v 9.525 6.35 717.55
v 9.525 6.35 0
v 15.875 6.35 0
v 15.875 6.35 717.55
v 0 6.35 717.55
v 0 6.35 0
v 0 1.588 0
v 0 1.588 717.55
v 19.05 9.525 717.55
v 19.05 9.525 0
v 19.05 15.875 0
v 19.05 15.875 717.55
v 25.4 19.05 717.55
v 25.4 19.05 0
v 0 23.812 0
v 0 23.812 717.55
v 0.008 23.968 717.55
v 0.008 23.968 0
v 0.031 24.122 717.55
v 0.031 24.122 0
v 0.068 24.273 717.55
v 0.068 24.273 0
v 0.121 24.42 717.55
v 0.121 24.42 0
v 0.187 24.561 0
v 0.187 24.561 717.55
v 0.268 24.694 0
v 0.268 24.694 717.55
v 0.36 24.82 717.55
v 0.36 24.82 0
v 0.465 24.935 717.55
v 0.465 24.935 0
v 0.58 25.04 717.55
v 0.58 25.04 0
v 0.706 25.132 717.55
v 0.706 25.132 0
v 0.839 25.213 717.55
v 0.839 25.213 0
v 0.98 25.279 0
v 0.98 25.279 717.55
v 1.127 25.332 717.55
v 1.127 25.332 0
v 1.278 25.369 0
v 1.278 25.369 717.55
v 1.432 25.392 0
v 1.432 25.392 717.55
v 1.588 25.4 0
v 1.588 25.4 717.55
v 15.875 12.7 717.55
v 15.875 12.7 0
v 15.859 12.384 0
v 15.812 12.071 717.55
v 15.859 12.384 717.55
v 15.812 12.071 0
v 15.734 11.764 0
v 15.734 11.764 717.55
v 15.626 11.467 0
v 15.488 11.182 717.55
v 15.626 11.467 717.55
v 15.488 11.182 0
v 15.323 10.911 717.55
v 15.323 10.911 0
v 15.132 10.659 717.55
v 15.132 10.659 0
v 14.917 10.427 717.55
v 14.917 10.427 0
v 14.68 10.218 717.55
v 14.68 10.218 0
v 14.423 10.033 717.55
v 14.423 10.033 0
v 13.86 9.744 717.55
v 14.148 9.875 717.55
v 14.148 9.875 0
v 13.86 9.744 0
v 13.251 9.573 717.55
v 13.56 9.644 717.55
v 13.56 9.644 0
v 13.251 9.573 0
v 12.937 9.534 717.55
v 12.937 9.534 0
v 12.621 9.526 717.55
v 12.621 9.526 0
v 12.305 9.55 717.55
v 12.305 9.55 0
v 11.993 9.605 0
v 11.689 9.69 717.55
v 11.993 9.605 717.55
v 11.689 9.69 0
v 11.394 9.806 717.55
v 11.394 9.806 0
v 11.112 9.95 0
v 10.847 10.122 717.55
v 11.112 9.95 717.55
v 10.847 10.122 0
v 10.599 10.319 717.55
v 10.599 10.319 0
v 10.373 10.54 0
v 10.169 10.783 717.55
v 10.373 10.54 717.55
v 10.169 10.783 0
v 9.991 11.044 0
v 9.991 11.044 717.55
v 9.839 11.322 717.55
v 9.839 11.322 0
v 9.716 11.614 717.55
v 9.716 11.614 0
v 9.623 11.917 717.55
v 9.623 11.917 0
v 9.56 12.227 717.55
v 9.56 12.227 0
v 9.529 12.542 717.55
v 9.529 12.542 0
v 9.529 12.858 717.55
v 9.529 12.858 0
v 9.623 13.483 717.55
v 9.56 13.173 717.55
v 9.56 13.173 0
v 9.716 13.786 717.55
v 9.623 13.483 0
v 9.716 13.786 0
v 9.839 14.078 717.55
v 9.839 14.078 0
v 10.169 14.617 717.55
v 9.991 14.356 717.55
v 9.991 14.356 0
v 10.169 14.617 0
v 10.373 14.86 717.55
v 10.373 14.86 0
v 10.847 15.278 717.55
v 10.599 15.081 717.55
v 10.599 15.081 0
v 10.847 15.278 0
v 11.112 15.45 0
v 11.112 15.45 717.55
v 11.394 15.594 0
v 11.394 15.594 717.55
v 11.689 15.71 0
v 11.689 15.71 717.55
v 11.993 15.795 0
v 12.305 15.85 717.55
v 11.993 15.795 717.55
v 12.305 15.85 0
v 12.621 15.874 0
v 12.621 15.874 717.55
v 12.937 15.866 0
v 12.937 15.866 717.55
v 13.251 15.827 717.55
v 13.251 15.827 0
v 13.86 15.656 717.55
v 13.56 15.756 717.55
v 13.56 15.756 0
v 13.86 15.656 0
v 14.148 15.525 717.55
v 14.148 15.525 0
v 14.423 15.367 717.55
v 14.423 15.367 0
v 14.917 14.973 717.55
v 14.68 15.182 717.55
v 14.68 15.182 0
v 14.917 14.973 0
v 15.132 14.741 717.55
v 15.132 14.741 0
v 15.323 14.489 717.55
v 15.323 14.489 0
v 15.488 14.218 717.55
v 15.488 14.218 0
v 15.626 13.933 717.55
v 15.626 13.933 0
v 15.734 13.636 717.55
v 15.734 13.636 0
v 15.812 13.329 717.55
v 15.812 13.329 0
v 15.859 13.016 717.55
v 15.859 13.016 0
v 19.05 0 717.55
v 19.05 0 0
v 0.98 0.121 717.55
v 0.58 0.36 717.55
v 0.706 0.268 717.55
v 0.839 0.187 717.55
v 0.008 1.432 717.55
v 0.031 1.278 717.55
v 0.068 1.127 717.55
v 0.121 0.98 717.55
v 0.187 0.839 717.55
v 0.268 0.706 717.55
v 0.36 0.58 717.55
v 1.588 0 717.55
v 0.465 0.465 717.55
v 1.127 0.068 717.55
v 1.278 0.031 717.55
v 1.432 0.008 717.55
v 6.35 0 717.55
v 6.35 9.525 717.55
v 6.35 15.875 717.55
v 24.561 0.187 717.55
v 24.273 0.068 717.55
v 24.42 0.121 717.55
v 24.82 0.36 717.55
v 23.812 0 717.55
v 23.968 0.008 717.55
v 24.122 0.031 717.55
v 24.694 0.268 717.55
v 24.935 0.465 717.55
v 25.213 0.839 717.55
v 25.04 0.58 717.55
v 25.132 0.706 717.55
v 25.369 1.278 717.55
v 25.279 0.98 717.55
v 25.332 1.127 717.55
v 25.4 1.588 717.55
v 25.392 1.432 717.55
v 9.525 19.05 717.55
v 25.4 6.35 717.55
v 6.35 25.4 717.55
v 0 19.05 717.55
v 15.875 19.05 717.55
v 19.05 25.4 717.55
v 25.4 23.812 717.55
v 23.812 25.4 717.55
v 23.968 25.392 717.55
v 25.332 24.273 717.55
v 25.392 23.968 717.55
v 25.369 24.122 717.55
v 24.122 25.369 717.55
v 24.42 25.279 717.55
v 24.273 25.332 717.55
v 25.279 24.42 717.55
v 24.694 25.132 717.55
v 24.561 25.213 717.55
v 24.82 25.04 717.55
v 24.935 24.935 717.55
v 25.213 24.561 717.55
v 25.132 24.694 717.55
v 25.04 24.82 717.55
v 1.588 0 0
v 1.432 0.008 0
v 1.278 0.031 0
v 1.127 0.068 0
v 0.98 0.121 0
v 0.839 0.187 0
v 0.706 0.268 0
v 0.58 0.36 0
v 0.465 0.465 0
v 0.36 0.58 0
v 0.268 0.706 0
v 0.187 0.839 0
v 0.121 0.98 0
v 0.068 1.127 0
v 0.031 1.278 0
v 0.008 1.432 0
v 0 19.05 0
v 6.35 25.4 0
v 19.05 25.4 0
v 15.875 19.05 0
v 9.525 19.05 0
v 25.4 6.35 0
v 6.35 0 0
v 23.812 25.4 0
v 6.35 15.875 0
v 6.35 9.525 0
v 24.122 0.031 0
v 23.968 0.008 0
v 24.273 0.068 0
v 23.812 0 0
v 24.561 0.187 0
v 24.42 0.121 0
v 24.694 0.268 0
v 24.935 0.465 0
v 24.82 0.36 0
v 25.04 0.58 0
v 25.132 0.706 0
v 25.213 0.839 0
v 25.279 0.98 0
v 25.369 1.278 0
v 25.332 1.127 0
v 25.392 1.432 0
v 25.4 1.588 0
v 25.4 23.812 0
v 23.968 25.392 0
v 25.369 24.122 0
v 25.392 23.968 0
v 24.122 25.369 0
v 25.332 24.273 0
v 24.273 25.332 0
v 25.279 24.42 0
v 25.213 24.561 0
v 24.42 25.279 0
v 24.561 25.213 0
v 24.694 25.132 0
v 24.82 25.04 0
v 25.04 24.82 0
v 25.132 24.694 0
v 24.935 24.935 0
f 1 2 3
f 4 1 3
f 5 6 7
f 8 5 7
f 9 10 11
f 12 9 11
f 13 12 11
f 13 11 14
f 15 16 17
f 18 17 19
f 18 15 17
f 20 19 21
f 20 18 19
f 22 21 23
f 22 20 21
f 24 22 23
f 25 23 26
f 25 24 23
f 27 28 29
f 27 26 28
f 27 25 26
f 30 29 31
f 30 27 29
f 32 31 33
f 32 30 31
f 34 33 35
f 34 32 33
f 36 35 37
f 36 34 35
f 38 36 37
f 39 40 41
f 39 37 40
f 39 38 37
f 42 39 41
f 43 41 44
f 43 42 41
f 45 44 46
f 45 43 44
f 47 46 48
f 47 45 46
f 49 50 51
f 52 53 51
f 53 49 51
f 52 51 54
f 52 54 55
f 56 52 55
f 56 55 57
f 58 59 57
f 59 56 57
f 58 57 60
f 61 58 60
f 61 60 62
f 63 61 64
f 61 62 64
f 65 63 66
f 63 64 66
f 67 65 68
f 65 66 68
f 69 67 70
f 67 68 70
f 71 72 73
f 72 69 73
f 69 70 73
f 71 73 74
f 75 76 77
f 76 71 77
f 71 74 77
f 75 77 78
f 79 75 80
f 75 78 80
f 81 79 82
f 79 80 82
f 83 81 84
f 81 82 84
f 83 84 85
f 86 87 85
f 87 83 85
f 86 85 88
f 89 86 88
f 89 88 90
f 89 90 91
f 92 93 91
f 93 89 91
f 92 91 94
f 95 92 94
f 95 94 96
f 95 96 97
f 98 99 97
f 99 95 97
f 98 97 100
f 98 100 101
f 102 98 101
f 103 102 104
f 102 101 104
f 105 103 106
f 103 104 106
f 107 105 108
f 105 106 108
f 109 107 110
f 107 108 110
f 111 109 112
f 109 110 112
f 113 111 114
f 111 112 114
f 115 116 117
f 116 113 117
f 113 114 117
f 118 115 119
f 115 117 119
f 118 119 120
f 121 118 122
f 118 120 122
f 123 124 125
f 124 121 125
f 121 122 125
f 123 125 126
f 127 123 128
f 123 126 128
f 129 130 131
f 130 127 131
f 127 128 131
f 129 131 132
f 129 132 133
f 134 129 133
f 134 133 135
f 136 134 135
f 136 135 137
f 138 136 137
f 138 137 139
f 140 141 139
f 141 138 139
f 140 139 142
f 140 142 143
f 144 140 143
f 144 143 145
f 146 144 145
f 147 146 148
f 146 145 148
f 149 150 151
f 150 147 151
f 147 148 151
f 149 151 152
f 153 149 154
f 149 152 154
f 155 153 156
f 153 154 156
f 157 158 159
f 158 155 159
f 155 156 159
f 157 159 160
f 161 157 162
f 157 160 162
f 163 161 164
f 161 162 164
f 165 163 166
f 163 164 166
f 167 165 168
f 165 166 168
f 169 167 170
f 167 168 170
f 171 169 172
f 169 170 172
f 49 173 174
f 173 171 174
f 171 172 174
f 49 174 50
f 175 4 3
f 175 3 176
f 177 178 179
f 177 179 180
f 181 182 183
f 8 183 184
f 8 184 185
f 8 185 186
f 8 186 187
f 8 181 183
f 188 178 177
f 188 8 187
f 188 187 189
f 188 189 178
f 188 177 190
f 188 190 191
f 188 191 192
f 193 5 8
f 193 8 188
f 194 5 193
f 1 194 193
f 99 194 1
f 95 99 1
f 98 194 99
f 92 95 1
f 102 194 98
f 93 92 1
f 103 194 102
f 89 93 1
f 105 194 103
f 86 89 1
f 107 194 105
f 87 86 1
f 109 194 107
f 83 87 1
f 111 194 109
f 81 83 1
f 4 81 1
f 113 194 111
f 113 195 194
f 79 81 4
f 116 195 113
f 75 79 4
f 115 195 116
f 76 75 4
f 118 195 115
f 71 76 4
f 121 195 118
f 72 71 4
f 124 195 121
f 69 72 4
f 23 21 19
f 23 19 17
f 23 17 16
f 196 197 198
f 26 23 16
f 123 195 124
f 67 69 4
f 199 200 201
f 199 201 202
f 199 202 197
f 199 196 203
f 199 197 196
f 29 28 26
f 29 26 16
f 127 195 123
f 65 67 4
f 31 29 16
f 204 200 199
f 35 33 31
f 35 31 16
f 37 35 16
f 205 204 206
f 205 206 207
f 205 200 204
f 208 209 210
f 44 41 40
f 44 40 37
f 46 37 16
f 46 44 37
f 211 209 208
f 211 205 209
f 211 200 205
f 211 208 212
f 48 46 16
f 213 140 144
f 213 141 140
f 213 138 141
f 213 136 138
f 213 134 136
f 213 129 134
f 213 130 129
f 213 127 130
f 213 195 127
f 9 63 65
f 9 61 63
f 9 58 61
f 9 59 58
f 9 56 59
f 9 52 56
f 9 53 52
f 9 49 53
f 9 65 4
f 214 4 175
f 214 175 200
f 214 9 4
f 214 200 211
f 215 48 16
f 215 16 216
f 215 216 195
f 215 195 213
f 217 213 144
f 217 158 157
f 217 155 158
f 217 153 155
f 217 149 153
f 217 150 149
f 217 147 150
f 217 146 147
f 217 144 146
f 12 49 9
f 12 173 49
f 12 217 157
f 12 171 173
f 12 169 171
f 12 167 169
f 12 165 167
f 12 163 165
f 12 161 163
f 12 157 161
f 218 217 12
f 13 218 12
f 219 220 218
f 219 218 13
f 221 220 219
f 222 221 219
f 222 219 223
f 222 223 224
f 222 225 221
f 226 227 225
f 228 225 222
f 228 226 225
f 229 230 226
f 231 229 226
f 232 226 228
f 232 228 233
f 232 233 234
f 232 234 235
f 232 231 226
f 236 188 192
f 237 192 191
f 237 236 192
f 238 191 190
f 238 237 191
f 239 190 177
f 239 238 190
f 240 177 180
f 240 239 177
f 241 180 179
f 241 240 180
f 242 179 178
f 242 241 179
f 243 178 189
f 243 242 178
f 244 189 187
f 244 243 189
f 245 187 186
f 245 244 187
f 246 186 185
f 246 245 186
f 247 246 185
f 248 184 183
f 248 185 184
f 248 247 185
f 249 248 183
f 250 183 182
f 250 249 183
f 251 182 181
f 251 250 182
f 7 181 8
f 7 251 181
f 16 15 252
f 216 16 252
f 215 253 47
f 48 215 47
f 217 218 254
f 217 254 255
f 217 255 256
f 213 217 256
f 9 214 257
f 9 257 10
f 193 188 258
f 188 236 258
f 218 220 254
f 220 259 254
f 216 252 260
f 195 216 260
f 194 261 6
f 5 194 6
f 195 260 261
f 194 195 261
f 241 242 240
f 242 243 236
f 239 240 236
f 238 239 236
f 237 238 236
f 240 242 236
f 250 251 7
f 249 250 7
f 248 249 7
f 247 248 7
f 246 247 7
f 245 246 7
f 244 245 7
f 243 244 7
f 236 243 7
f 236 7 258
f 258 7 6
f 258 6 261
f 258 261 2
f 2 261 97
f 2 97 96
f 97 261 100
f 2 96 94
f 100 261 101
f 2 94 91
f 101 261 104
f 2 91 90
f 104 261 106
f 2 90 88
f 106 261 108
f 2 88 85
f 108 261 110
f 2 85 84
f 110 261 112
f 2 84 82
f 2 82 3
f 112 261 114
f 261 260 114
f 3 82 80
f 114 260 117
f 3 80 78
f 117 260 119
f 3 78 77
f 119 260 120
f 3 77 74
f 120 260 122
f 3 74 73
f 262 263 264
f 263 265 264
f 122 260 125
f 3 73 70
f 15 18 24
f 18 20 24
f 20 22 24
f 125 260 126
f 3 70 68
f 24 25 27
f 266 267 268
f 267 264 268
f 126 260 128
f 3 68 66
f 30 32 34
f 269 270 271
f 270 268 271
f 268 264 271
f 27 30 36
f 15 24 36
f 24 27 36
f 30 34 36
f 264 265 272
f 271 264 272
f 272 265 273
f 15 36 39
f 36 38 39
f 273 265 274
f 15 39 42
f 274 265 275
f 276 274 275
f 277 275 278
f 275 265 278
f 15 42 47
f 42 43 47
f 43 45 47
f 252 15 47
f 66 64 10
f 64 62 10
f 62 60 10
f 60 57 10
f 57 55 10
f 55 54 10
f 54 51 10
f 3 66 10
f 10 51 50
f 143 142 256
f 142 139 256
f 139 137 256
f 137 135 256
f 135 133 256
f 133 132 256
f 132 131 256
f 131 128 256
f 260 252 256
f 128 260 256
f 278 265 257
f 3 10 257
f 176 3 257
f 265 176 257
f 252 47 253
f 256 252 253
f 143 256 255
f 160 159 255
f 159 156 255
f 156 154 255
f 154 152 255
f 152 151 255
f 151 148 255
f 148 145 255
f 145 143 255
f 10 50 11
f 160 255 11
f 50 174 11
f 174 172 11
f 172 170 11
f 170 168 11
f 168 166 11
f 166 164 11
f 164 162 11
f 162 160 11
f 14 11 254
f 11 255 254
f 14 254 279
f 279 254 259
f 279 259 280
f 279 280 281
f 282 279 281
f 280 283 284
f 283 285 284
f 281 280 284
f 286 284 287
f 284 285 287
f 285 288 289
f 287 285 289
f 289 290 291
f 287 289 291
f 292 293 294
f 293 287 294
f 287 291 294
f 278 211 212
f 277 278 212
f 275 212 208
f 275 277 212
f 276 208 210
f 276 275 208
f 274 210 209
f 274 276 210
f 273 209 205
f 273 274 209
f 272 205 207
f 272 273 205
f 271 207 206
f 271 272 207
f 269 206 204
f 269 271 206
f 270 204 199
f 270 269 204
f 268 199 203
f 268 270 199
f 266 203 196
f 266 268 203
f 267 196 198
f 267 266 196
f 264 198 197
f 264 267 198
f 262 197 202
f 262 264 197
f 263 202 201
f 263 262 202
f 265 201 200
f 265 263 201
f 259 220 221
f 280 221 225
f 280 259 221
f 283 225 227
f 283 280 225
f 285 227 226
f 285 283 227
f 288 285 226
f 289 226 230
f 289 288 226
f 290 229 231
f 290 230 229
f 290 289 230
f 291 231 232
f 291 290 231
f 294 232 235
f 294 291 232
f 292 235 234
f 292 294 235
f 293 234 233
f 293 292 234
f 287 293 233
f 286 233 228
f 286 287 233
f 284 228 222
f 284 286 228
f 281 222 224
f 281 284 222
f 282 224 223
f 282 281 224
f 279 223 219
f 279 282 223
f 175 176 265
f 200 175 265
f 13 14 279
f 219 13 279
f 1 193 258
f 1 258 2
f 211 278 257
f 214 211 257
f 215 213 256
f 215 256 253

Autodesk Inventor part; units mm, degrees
ref_plane "YZ Plane" through (0, 0, 0) normal (1, 0, 0) x (0, 1, 0)
ref_plane "XZ Plane" through (0, 0, 0) normal (0, 1, 0) x (-1, 0, 0)
ref_plane "XY Plane" through (0, 0, 0) normal (0, 0, 1) x (1, 0, 0)
sketch "Sketch1" plane through (0, 0, 0) normal (0, 0, 1) x (1, 0, 0)
  line L0 (0, 0) -> (25.4, 0)
  line L1 (25.4, 0) -> (25.4, 25.4)
  line L2 (25.4, 25.4) -> (0, 25.4)
  line L3 (0, 25.4) -> (0, 0)
  circle A0 centre (12.7, 12.7) radius 3.175
  dimension "d0" = 25.4
  dimension "d1" = 25.4
  dimension "d2" = 6.35
  dimension "d7" = 12.7
  dimension "d8" = 12.7
extrude "Extrusion1" add sketch "Sketch1" along normal blind 609.6
sketch "Sketch2" plane through (0, 0, 609.6) normal (0, 0, 1) x (1, 0, 0)
  line L0 (25.4, 25.4) -> (0, 25.4) projected
  line L1 (0, 25.4) -> (0, 0) projected
  circle A0 centre (12.7, 12.7) radius 3.175 projected
  line L2 (0, 0) -> (25.4, 0) projected
  line L3 (25.4, 0) -> (25.4, 25.4) projected
  line L4 (25.4, 25.4) -> (0, 25.4) projected
  line L5 (0, 25.4) -> (0, 0) projected
  line L6 (12.7, 19.05) -> (9.525, 19.05)
  line L7 (9.525, 19.05) -> (15.875, 19.05)
  line L8 (15.875, 19.05) -> (19.05, 25.4)
  line L9 (9.525, 19.05) -> (6.35, 25.4)
  dimension "d13" = 6.35
  dimension "d14" = 6.35
  dimension "d15" = 3.175
  dimension "d16" = 6.35
fillet "Fillet1" radius 1.5875 4 edges at (25.4, 25.4, 304.8) (0, 25.4, 304.8) (25.4, 0, 304.8) (0, 0, 304.8)
extrude "Extrusion2" cut sketch "Sketch2" against normal blind 609.6 contours L8 L7 L6 L9 L0
pattern_circular "Circular Pattern1" count 4 over 360 about axis through (12.7, 12.7, 0) along (0, 0, 1) of "Extrusion2"
sketch "Sketch3" plane through (0, 0, 609.6) normal (0, 0, 1) x (1, 0, 0)
  line L0 (19.05, 15.875) -> (25.4, 19.05) projected
  line L1 (25.4, 19.05) -> (25.4, 23.8125) projected
  arc A0 (25.4, 23.8125) -> (23.8125, 25.4) centre (23.8125, 23.8125) ccw projected
  line L2 (23.8125, 25.4) -> (19.05, 25.4) projected
  line L3 (19.05, 25.4) -> (15.875, 19.05) projected
  line L4 (15.875, 19.05) -> (9.525, 19.05) projected
  line L5 (9.525, 19.05) -> (6.35, 25.4) projected
  line L6 (6.35, 25.4) -> (1.5875, 25.4) projected
  arc A1 (1.5875, 25.4) -> (0, 23.8125) centre (1.5875, 23.8125) ccw projected
  line L7 (0, 23.8125) -> (0, 19.05) projected
  line L8 (0, 19.05) -> (6.35, 15.875) projected
  line L9 (6.35, 15.875) -> (6.35, 9.525) projected
  line L10 (6.35, 9.525) -> (0, 6.35) projected
  line L11 (0, 6.35) -> (0, 1.5875) projected
  arc A2 (0, 1.5875) -> (1.5875, 0) centre (1.5875, 1.5875) ccw projected
  line L12 (1.5875, 0) -> (6.35, 0) projected
  line L13 (6.35, 0) -> (9.525, 6.35) projected
  line L14 (9.525, 6.35) -> (15.875, 6.35) projected
  line L15 (15.875, 6.35) -> (19.05, 0) projected
  line L16 (19.05, 0) -> (23.8125, 0) projected
  arc A3 (23.8125, 0) -> (25.4, 1.5875) centre (23.8125, 1.5875) ccw projected
  line L17 (25.4, 1.5875) -> (25.4, 6.35) projected
  line L18 (25.4, 6.35) -> (19.05, 9.525) projected
  line L19 (19.05, 9.525) -> (19.05, 15.875) projected
  circle A4 centre (12.7, 12.7) radius 3.175 projected
  point P0 (0, 0)
extrude "Extrusion3" add sketch "Sketch3" along normal blind 107.95
properties part number "Mock 8020 28.25in" material "Aluminum 6061"
